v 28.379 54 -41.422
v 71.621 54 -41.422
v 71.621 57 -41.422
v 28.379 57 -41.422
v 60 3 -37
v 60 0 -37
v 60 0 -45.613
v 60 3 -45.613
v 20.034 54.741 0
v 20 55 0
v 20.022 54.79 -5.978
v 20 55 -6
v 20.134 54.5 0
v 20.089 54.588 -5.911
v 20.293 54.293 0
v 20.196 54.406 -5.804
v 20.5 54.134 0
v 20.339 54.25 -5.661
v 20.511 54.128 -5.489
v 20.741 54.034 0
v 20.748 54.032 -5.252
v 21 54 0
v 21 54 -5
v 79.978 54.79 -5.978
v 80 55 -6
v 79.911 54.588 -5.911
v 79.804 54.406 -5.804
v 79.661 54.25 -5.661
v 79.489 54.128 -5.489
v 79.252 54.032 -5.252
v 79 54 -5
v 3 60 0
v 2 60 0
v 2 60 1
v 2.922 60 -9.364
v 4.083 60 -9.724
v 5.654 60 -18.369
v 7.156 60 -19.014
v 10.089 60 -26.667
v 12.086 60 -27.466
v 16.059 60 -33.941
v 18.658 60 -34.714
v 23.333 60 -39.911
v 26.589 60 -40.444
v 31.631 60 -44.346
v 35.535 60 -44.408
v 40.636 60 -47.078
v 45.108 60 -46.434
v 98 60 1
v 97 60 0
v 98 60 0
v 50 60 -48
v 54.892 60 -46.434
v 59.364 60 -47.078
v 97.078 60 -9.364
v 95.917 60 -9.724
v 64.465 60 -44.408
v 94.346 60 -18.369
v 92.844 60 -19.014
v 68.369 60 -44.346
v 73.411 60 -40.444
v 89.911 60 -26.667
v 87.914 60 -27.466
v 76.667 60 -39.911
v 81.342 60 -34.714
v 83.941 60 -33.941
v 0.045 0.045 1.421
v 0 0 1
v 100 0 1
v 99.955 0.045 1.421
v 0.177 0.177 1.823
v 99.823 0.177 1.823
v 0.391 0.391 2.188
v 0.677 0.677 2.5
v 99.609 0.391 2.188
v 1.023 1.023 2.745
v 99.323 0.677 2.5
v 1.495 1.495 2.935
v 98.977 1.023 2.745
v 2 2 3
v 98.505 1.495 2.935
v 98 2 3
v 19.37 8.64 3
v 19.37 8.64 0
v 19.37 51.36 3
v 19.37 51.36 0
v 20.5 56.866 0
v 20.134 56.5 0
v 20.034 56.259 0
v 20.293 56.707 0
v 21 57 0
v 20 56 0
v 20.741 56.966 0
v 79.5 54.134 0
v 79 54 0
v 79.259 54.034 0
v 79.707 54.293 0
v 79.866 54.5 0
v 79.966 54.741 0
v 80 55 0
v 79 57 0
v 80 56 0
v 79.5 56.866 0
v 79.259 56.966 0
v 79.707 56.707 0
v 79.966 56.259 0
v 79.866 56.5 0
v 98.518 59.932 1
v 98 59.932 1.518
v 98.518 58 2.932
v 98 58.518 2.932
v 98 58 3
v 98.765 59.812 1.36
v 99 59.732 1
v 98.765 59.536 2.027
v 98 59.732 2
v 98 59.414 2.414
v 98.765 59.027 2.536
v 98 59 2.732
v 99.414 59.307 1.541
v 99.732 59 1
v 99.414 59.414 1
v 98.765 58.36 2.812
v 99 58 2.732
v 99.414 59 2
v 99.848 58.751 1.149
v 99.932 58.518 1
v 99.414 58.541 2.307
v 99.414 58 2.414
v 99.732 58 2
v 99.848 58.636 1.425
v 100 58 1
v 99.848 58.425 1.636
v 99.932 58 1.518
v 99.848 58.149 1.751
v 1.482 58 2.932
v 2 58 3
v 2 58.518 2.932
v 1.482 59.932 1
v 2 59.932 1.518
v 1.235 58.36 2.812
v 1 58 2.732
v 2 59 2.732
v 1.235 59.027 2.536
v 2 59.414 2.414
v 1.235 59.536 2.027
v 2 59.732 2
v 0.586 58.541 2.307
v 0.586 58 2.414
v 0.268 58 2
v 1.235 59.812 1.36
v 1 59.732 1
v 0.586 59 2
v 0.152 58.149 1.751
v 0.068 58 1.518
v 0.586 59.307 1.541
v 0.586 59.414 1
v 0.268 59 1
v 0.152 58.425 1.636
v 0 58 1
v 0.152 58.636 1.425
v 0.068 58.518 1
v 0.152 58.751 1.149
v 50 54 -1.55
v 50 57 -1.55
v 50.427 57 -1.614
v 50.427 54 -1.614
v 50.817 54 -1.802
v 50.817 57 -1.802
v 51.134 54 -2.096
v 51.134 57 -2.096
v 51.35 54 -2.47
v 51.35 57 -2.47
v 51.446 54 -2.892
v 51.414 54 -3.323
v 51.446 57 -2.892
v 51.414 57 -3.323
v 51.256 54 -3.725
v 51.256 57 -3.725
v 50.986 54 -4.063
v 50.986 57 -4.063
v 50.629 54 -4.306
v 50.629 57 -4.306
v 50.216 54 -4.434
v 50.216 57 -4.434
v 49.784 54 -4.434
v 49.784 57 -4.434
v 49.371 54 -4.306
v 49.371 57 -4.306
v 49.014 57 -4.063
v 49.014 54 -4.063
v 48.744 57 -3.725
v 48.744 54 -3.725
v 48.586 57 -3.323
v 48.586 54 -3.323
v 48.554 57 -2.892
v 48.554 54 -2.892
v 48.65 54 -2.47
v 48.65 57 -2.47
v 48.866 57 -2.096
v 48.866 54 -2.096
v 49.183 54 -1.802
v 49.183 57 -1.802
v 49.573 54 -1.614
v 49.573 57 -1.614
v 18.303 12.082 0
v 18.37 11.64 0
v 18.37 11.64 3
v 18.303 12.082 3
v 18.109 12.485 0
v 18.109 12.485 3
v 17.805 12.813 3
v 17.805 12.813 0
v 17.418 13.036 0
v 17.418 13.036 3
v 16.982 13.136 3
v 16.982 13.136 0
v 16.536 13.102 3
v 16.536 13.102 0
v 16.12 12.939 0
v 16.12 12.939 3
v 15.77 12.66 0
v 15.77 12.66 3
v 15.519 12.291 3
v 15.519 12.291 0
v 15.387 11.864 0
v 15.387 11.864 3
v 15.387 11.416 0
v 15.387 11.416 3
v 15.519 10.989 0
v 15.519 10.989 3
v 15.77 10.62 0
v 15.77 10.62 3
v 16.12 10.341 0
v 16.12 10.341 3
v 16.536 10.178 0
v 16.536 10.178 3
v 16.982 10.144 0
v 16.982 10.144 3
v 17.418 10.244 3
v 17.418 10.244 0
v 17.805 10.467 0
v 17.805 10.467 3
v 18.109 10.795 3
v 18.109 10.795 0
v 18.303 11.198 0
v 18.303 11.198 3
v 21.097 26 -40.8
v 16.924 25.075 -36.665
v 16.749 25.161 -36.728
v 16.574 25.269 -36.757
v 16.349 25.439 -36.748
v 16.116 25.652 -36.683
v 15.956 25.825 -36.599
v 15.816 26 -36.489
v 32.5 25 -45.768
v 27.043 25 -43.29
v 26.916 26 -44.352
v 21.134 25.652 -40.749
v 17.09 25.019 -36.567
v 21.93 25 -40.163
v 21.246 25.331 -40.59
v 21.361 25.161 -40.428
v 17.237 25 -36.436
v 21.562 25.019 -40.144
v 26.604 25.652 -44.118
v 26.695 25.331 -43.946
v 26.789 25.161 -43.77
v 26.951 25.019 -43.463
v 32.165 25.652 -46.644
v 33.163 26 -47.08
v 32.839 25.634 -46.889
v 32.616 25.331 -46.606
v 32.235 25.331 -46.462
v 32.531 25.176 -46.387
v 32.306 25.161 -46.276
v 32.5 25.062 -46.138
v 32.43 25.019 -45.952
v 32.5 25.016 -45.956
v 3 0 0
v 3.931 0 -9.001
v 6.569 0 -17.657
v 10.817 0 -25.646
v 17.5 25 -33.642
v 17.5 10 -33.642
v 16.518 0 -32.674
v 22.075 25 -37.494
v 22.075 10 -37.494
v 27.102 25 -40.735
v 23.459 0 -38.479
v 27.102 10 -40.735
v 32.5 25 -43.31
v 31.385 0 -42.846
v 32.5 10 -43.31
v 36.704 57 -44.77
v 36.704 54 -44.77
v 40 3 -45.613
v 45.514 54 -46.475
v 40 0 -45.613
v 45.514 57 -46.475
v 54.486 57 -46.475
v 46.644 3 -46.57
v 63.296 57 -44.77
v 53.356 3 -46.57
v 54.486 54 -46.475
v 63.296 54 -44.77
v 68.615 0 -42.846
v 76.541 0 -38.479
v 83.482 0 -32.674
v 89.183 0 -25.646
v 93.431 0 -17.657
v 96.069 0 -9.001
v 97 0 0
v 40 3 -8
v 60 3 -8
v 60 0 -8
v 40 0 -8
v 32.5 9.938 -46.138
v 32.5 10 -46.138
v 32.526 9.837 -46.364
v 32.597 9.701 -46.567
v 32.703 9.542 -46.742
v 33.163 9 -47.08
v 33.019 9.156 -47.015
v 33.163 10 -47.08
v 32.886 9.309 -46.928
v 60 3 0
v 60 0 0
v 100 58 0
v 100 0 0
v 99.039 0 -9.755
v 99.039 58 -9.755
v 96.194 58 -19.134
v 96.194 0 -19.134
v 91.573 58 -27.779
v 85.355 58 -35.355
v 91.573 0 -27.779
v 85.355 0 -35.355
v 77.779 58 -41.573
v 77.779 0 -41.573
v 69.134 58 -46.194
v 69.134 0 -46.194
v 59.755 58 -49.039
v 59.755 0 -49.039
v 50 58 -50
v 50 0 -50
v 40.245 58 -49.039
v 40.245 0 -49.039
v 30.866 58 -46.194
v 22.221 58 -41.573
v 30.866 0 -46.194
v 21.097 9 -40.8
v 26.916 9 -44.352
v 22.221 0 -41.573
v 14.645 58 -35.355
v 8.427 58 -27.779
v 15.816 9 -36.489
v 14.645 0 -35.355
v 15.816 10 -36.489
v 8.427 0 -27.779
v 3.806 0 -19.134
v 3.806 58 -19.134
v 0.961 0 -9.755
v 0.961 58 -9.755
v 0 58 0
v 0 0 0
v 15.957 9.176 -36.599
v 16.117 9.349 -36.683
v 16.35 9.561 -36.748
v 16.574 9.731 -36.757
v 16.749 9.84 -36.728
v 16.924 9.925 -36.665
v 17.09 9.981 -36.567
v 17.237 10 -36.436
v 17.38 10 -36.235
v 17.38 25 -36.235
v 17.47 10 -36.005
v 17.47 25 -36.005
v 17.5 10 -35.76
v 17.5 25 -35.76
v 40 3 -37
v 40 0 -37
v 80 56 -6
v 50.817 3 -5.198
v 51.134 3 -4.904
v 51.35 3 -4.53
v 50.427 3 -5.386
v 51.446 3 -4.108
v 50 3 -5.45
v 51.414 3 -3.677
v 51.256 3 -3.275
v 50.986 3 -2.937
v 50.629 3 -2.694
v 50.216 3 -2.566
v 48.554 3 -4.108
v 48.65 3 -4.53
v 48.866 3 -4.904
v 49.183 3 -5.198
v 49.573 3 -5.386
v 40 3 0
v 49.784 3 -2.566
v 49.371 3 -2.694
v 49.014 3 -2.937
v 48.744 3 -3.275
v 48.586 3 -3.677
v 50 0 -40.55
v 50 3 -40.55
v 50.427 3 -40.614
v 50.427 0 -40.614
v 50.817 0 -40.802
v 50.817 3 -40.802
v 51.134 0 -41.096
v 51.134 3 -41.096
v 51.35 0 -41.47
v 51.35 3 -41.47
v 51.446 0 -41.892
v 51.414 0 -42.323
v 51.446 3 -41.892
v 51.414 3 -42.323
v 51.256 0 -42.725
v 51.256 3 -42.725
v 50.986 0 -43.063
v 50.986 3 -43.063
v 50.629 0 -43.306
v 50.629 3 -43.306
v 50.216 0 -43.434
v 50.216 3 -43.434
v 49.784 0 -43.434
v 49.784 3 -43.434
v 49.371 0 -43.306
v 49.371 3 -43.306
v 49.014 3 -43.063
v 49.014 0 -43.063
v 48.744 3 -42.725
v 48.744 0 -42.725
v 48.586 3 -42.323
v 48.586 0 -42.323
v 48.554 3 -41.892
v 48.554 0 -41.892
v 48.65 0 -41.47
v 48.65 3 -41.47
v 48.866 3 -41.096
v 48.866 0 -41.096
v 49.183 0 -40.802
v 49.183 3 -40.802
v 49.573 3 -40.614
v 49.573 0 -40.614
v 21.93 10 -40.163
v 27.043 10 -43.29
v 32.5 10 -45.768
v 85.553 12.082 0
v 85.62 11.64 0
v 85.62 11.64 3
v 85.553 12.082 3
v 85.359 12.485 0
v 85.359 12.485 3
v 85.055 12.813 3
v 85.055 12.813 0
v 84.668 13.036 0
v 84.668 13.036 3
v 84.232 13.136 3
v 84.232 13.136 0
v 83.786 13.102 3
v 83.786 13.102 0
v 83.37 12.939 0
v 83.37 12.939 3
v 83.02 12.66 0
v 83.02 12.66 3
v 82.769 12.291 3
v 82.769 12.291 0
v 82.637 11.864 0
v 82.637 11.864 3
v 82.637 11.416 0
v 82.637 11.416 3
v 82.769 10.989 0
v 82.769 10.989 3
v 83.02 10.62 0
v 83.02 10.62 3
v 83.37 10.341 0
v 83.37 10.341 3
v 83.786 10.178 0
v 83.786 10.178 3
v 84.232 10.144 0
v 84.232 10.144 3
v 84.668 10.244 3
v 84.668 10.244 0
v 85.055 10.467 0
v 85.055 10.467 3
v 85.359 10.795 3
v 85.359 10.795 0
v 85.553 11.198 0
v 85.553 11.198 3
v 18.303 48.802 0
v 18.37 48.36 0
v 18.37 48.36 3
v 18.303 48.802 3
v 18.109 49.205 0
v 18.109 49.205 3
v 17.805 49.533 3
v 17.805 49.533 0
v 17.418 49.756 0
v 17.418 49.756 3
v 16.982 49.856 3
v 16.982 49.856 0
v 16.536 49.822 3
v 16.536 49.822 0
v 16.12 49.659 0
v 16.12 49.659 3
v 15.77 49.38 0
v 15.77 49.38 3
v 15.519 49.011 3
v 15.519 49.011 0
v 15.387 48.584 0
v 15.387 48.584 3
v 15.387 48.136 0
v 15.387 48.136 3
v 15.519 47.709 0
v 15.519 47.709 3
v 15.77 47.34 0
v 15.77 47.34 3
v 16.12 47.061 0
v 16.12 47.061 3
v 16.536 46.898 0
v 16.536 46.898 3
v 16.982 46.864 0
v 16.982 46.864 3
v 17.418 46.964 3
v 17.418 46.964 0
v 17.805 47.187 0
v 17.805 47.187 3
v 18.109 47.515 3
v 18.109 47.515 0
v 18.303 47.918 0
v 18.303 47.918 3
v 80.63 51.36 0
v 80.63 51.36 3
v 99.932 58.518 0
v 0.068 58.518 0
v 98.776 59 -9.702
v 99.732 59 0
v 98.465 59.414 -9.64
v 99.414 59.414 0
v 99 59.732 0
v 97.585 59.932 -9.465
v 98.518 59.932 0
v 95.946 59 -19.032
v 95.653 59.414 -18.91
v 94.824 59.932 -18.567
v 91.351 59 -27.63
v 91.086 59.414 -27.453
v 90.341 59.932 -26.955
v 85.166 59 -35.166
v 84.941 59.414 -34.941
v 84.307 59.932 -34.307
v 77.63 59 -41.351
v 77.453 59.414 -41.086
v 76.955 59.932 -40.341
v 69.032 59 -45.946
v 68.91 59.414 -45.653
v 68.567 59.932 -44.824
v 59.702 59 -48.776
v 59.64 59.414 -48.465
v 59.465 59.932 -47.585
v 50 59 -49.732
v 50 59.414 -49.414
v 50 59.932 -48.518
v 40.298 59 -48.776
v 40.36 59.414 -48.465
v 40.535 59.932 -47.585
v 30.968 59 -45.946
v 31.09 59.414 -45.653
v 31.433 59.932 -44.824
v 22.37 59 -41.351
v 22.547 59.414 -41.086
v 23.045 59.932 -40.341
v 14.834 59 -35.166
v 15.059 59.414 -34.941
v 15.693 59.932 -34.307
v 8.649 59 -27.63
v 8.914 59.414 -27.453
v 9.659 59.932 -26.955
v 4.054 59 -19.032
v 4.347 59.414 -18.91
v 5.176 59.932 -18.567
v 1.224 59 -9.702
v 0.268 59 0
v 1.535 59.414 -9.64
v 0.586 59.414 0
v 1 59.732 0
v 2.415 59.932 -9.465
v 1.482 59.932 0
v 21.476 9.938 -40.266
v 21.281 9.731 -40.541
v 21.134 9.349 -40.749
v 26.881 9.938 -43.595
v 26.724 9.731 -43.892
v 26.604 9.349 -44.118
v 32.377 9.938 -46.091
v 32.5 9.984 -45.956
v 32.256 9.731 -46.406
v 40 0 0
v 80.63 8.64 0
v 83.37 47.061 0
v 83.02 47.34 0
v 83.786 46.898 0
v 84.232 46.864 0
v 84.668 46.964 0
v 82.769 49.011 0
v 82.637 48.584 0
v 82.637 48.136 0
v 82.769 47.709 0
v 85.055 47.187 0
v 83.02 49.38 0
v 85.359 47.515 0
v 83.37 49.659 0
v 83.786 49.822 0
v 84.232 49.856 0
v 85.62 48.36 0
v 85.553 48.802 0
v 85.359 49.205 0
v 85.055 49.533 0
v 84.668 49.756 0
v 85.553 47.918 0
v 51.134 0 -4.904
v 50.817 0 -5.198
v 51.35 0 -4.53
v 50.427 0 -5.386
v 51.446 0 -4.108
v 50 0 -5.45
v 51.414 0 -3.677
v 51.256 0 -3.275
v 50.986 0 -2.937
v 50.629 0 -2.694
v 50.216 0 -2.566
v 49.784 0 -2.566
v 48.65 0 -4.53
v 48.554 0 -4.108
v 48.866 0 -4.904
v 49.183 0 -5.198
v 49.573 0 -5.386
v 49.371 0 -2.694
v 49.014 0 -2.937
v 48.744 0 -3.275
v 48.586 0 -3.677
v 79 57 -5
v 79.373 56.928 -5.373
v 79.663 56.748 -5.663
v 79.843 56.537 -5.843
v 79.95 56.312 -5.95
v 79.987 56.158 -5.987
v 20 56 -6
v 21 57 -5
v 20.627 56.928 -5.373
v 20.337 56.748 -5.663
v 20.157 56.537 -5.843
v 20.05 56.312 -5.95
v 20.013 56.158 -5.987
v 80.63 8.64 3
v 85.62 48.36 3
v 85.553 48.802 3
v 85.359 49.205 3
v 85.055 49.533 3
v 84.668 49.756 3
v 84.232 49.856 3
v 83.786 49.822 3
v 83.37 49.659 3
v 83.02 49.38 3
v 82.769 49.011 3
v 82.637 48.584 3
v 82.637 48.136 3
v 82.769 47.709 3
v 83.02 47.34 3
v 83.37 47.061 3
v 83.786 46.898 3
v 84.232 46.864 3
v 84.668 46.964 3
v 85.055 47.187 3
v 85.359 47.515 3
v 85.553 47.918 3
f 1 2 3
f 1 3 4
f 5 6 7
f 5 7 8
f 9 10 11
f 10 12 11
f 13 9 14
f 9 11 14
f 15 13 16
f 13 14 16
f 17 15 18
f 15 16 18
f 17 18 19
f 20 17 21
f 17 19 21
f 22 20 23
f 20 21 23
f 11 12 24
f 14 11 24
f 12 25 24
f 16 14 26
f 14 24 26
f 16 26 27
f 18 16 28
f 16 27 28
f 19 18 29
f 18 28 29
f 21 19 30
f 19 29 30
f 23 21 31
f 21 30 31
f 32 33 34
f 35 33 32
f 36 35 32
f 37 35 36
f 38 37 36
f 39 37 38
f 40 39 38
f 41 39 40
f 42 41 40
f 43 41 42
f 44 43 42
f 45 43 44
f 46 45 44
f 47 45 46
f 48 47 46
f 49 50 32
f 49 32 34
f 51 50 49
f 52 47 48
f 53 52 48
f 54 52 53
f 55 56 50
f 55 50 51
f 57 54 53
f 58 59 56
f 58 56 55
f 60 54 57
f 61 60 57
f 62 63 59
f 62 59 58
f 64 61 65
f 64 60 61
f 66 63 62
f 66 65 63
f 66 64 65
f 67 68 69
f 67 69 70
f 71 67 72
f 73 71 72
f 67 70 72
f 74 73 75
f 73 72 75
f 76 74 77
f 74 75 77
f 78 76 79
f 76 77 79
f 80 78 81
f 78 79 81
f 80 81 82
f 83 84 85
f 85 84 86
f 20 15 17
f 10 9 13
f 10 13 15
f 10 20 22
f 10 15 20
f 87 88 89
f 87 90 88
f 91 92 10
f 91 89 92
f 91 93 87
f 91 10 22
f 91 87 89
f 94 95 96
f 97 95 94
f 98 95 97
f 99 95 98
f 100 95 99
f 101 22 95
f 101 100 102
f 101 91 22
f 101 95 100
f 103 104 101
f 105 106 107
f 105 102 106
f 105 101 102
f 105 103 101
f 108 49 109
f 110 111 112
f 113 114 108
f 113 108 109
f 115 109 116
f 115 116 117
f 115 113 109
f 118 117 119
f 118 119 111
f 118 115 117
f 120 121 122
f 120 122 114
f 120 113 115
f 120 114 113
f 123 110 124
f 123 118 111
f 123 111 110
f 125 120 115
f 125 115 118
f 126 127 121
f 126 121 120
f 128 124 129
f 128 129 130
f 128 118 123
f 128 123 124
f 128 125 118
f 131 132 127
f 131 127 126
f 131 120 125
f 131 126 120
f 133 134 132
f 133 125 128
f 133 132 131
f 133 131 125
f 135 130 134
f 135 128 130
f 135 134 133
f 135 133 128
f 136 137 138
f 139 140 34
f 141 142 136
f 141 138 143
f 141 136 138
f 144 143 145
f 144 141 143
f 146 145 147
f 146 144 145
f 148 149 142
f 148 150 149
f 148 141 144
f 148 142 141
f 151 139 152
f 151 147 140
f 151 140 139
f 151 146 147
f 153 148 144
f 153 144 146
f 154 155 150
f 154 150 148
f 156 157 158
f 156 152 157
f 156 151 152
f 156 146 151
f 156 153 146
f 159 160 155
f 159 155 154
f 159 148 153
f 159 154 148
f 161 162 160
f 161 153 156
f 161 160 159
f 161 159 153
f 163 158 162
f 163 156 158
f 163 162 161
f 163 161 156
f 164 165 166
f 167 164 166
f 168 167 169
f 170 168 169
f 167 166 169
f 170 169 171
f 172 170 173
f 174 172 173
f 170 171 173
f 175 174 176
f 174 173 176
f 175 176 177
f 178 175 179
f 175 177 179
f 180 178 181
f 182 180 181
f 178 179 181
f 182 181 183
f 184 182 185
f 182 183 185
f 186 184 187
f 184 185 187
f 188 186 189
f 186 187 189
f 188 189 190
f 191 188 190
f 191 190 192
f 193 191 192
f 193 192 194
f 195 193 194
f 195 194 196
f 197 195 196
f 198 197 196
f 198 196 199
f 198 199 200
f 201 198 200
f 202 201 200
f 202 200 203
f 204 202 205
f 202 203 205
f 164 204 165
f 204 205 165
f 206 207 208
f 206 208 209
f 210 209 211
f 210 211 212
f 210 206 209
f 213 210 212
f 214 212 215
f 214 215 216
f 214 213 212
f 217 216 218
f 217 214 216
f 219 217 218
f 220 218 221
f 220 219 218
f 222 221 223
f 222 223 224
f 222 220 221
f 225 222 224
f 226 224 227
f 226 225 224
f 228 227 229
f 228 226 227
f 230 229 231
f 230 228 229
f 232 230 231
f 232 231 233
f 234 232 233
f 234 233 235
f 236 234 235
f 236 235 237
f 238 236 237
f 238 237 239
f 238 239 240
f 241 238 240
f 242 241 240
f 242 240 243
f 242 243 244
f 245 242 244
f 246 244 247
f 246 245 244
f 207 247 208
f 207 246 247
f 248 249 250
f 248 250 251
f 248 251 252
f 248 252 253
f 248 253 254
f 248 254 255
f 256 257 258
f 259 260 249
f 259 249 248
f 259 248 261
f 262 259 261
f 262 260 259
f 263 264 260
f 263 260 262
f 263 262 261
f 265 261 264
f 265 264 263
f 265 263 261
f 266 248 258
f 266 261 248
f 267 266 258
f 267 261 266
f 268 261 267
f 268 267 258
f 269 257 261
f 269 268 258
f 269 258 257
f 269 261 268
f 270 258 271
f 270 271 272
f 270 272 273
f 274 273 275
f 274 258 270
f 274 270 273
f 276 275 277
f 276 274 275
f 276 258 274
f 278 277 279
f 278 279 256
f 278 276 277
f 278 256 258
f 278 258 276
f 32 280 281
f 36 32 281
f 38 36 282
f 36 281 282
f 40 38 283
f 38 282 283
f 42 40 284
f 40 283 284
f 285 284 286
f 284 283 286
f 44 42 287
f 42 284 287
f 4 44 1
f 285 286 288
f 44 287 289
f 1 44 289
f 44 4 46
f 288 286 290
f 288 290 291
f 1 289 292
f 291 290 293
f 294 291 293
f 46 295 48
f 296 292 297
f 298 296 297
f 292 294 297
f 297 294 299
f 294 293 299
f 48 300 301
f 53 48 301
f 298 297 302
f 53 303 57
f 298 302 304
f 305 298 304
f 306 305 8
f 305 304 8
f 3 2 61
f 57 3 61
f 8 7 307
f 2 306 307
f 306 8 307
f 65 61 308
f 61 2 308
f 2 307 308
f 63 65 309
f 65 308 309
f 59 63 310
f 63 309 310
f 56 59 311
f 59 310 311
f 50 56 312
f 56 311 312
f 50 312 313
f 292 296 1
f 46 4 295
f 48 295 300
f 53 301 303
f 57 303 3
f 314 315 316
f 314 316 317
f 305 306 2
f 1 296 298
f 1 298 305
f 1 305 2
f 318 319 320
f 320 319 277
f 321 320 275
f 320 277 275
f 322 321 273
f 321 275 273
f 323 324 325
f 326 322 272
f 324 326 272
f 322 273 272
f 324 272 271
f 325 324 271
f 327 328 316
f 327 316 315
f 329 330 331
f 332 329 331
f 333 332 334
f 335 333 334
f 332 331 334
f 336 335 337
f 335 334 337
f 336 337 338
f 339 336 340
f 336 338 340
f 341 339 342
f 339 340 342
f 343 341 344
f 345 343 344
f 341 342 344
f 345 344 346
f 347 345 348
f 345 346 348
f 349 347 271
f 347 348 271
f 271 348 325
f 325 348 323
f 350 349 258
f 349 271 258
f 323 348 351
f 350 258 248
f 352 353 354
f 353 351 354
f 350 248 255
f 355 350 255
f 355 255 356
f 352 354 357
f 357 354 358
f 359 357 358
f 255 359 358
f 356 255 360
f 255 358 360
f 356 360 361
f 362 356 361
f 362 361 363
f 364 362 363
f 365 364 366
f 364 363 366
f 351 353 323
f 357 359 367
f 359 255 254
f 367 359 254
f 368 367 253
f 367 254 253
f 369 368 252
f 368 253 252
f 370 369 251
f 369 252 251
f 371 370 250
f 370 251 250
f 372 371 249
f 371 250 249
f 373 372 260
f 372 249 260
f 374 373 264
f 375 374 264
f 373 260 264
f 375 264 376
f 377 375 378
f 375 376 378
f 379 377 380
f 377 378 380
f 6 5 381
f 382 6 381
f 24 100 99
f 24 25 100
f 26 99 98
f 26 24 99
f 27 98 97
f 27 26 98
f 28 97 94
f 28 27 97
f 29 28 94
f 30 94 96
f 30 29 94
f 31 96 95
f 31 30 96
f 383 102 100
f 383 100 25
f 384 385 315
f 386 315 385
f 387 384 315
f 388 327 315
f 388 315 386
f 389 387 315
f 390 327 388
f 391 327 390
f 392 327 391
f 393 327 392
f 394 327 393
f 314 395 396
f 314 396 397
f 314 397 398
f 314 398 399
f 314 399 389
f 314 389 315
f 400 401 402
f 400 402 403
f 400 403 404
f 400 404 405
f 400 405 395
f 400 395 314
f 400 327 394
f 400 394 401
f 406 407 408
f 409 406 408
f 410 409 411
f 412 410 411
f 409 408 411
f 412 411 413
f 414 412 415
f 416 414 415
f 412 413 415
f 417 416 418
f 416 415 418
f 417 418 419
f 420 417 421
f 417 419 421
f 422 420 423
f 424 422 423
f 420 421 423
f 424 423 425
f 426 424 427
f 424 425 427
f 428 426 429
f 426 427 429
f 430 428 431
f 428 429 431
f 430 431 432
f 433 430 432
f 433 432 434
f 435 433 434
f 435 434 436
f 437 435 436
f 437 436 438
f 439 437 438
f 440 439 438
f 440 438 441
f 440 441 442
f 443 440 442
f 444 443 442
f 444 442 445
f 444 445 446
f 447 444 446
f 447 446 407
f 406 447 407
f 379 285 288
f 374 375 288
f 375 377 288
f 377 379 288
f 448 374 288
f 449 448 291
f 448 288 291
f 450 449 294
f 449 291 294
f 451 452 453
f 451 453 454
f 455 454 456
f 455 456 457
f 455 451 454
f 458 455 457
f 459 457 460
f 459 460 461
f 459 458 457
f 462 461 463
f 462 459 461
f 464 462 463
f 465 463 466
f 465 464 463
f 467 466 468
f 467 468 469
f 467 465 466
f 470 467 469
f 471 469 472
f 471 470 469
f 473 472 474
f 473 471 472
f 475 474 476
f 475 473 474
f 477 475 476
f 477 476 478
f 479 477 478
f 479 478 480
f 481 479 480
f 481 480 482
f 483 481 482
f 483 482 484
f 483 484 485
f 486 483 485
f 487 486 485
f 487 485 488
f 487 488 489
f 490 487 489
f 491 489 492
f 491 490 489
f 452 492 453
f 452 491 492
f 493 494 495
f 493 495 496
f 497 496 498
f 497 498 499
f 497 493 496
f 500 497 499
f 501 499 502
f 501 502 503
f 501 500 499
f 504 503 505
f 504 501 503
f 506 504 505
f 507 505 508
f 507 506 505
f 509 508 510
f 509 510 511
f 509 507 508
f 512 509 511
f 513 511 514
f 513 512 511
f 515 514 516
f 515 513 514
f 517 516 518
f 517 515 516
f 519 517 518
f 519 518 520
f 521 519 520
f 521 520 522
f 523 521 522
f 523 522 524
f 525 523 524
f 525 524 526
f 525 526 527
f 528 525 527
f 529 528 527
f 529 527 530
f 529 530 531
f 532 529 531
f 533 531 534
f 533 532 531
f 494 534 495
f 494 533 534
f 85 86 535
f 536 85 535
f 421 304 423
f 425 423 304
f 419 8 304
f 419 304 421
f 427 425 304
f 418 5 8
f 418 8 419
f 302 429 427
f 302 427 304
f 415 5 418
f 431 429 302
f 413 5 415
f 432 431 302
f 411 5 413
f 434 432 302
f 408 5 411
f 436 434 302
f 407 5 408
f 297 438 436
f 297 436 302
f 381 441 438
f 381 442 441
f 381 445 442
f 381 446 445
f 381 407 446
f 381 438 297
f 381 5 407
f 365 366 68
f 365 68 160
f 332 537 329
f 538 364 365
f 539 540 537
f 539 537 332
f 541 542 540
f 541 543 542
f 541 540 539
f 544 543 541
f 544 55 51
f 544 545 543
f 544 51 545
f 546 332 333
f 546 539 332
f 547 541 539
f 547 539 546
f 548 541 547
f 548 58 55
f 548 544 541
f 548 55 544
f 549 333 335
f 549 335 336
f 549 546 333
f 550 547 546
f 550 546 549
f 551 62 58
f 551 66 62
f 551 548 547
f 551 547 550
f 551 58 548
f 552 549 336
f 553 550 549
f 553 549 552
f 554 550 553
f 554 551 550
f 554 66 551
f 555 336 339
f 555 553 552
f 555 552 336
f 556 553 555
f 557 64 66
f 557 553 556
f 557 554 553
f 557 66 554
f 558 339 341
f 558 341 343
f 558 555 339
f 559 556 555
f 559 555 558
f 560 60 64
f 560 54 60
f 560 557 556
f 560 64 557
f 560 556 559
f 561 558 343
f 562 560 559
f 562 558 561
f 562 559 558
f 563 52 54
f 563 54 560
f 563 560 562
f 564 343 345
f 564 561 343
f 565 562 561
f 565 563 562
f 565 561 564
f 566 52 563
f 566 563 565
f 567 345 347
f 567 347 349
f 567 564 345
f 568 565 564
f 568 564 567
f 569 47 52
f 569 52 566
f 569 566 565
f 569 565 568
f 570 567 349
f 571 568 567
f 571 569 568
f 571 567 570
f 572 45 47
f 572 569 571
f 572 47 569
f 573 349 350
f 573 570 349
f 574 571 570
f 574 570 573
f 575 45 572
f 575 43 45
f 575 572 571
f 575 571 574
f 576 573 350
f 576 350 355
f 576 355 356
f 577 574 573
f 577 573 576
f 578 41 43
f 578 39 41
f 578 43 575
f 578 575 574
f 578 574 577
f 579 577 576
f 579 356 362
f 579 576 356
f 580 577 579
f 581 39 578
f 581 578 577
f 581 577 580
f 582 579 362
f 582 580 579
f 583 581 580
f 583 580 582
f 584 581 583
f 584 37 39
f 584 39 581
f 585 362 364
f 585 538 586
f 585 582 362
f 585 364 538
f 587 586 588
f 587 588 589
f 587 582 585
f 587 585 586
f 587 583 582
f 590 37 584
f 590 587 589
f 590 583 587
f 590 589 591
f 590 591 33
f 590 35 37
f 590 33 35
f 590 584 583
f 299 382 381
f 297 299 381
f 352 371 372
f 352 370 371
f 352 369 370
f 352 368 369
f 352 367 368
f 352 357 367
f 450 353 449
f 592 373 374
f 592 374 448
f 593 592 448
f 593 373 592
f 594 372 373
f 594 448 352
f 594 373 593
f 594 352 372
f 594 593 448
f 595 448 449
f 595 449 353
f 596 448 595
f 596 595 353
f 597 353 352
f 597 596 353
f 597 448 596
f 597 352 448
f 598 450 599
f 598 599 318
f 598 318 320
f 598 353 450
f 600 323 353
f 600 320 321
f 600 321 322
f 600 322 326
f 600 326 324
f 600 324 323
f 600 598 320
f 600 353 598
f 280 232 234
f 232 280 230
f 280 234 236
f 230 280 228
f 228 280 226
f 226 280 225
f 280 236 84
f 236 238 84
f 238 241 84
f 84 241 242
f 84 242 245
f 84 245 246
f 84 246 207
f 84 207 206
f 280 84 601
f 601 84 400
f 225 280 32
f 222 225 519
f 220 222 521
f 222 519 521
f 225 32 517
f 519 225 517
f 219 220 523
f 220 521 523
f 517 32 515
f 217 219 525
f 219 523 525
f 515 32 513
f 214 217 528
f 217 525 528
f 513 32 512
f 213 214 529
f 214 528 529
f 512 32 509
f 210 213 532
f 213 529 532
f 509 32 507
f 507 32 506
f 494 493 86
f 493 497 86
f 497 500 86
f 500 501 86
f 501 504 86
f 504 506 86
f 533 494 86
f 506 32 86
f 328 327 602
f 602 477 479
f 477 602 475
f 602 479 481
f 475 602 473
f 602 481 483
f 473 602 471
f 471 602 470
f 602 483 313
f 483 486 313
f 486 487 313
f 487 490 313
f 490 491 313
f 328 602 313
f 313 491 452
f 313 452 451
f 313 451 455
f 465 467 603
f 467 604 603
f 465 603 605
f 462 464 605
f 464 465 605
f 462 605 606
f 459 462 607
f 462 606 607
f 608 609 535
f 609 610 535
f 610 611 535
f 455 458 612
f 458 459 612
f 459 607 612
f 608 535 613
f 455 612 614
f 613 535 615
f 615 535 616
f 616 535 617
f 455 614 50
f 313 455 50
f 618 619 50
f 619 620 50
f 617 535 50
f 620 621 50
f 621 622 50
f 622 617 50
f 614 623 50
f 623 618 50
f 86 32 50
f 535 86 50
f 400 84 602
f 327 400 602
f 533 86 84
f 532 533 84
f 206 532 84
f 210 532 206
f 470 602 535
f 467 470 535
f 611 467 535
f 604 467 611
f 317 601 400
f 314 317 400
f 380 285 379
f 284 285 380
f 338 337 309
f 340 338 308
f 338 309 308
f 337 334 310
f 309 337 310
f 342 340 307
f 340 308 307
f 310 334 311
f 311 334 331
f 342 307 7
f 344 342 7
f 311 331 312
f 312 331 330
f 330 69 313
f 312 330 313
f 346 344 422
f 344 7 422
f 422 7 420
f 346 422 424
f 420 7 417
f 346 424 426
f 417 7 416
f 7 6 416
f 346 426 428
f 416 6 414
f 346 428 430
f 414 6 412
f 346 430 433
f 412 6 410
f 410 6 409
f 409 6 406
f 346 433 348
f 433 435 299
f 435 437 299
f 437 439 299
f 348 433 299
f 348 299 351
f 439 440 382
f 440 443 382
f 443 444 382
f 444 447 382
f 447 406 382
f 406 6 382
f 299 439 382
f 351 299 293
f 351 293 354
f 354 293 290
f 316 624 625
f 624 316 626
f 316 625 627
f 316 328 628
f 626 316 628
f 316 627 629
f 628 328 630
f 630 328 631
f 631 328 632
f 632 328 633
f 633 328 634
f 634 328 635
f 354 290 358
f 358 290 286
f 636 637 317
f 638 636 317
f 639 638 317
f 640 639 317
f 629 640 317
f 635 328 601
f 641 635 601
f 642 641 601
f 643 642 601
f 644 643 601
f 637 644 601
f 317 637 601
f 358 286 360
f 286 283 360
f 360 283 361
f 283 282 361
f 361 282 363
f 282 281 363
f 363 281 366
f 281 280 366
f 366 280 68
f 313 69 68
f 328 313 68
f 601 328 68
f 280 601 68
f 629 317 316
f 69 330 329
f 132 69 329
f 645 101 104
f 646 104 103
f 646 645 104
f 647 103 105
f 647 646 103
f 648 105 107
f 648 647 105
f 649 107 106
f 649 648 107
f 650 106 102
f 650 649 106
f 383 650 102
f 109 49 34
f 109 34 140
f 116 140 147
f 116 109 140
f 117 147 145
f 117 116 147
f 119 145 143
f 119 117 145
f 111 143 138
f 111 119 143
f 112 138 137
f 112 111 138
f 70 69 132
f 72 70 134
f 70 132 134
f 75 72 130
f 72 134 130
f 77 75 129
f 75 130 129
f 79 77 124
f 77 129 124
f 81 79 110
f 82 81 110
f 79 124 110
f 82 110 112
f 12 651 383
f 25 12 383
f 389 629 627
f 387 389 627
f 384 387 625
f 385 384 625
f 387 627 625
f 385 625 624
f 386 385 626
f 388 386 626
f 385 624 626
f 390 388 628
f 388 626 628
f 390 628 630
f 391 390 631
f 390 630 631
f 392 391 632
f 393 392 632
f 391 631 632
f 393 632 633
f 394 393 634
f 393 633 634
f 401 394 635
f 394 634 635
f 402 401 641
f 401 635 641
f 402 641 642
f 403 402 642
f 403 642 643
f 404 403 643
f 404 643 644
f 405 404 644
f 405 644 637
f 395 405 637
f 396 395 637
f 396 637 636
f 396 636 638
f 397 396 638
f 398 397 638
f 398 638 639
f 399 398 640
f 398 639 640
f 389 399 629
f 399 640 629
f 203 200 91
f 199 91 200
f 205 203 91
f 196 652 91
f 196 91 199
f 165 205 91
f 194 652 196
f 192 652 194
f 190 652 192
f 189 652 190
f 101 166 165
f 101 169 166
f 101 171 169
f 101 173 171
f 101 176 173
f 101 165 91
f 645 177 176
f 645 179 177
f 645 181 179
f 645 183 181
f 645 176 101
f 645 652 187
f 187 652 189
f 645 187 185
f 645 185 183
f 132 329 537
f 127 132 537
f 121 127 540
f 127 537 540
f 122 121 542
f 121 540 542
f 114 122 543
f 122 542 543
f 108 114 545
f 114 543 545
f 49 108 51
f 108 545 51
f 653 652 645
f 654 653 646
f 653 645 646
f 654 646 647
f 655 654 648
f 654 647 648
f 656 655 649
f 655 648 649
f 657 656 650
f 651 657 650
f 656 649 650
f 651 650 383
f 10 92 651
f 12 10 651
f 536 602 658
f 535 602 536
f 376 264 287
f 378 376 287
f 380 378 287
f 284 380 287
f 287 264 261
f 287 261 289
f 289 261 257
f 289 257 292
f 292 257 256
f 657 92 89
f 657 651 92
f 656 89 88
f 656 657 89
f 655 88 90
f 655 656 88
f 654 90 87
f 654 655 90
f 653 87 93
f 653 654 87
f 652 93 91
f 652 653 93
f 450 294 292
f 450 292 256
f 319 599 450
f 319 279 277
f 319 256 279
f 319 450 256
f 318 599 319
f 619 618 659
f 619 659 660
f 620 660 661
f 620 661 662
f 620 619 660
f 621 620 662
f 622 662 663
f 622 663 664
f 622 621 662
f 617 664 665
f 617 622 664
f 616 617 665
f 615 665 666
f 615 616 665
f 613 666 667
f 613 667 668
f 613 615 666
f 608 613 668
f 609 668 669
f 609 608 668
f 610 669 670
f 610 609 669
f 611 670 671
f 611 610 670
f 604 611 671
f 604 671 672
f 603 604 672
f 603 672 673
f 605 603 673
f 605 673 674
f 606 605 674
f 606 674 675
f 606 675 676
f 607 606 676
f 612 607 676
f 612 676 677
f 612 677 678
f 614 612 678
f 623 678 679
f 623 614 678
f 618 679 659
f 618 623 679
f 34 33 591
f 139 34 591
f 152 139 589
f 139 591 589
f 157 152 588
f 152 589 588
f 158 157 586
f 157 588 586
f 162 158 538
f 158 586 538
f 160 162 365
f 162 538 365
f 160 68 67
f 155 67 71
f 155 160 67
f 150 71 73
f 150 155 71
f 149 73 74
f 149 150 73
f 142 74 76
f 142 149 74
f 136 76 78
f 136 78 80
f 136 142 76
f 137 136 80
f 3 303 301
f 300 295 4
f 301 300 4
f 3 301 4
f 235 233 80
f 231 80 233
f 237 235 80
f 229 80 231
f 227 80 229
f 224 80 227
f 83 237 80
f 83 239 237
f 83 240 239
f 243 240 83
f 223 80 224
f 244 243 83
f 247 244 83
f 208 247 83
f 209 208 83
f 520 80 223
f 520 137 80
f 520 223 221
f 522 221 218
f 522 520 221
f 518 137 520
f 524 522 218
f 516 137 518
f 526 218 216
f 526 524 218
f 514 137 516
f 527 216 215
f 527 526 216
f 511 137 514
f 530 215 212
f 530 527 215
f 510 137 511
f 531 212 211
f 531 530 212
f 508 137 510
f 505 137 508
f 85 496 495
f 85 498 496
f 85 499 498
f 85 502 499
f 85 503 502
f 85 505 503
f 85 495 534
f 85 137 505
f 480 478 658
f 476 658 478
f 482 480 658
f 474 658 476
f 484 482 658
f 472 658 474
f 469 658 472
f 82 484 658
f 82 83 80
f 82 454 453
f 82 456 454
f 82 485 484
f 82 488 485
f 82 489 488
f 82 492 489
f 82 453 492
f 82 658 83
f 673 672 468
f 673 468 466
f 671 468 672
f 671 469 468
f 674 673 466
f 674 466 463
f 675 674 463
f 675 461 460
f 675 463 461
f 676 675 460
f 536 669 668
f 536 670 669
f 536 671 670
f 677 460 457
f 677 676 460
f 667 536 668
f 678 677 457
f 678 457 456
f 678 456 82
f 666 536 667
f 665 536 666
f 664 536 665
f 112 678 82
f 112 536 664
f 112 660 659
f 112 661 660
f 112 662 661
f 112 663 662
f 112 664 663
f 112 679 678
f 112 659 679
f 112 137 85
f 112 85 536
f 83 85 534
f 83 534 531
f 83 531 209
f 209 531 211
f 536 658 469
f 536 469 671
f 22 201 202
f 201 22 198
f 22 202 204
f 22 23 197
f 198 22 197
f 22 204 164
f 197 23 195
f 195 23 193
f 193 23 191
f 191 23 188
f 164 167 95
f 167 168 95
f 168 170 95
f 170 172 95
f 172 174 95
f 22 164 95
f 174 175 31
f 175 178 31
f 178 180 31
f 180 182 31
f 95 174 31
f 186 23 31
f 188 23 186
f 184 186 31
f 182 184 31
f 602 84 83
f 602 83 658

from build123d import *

# Parameters (mm, degrees)
SKETCH1_W                = 100
SKETCH1_H                = 60
SKETCH1_R                = 1.5
SKETCH1_W_2              = 61.26
SKETCH1_H_2              = 42.72
FRONT_FACE_DEPTH         = 3
CURVED_BCK_DEPTH         = 60
FILLET1_R                = 2
FRONT_START              = 57
SKETCH3_W                = 60
SKETCH3_H                = 6
SKETCH3_R                = 1.45
FRONT_RETAINER_DEPTH     = 3
FILLET2_R                = 1
FILLET3_R                = 1
BOSS_EXTRUDE4_START      = 54
BOSS_EXTRUDE4_DEPTH      = 3
CUT_EXTRUDE1_START       = -10
SKETCH5_W                = 15
SKETCH5_H                = 15
CUT_EXTRUDE1_DEPTH       = 53
SKETCH6_W                = 20
SKETCH6_H                = 3
BOSS_EXTRUDE5_DEPTH      = 8
SKETCH7_R                = 1.45
CUT_EXTRUDE2_DEPTH       = 3
FILLET4_R                = 2
FILLET5_R                = 1
BOSS_EXTRUDE6_DEPTH      = 10
BOSS_EXTRUDE6_DEPTH_BACK = 1
BOSS_EXTRUDE6_START      = 30
SKETCH9_W                = 20
SKETCH9_H                = 3
SKETCH10_R               = 1.45
CUT_EXTRUDE3_DEPTH       = 10


with BuildPart() as part:
    # Sketch1 → Front Face (new body)
    with BuildSketch(Plane.XY):
        with Locations((50, 30)):
            Rectangle(SKETCH1_W, SKETCH1_H)
        with Locations((84.12, 48.36)):
            Circle(SKETCH1_R, mode=Mode.SUBTRACT)
        with Locations((16.87, 48.36)):
            Circle(SKETCH1_R, mode=Mode.SUBTRACT)
        with Locations((16.87, 11.64)):
            Circle(SKETCH1_R, mode=Mode.SUBTRACT)
        with Locations((84.12, 11.64)):
            Circle(SKETCH1_R, mode=Mode.SUBTRACT)
        with Locations((50, 30)):
            Rectangle(SKETCH1_W_2, SKETCH1_H_2, mode=Mode.SUBTRACT)
    extrude(amount=FRONT_FACE_DEPTH)

    # Sketch2 → Curved bck (add)
    with BuildSketch(Plane(origin=(0, 0, 0), x_dir=(1, 0, 0), z_dir=(0, 1, 0))):
        with BuildLine():
            Line((0, 0), (3, 0))
            ThreePointArc((3, 0), (50, 46.689559336), (97, 0))
            Line((97, 0), (100, 0))
            ThreePointArc((100, 0), (50, 50), (0, 0))
        make_face()
    extrude(amount=CURVED_BCK_DEPTH)

    # Fillet1
    fillet1_edges = [part.edges().sort_by_distance(p)[0] for p in [
        (100, 30, 3),
        (50, 60, 3),
        (0, 30, 3),
        (50, 0, 3),
    ]]
    fillet(fillet1_edges, radius=FILLET1_R)

    # Sketch4 → Boss-Extrude4 (add)
    with BuildSketch(Plane(origin=(0, 0, 0), x_dir=(1, 0, 0), z_dir=(0, 1, 0)).offset(BOSS_EXTRUDE4_START)):
        with BuildLine():
            Line((71.620680917, 41.421525868), (28.379319083, 41.421525868))
            ThreePointArc((28.379319083, 41.421525868), (50, 46.689559336), (71.620680917, 41.421525868))
        make_face()
    extrude(amount=BOSS_EXTRUDE4_DEPTH)

    # Sketch5 → Cut-Extrude1 (cut)
    with BuildSketch(Plane.XY.offset(CUT_EXTRUDE1_START)):
        with Locations((25, 17.5)):
            Rectangle(SKETCH5_W, SKETCH5_H)
    extrude(amount=-CUT_EXTRUDE1_DEPTH, mode=Mode.SUBTRACT)

    # Sketch6 → Boss-Extrude5 (add)
    with BuildSketch(Plane(origin=(0, 0, 0), x_dir=(-1, 0, 0), z_dir=(0, 0, -1))):
        with Locations((-50, 1.5)):
            Rectangle(SKETCH6_W, SKETCH6_H)
    extrude(amount=BOSS_EXTRUDE5_DEPTH)

    # Sketch7 → Cut-Extrude2 (cut)
    with BuildSketch(Plane.XZ):
        with Locations(Location((50, -4, 0), (0, 0, 270))):
            Circle(SKETCH7_R)
    extrude(amount=-CUT_EXTRUDE2_DEPTH, mode=Mode.SUBTRACT)

    # Fillet4
    # the kernel refuses this fillet: 2 mm, written as the material it takes off along each edge
    with BuildSketch(Plane(origin=(98, 58, 1), x_dir=(0, 1, 0), z_dir=(1, 0, 0))) as fillet4_piece_1_section:
        Polygon((0, 0), (FILLET4_R, 0), (FILLET4_R, FILLET4_R), (0, FILLET4_R), align=None)
    fillet4_piece_1 = extrude(amount=FILLET4_R, mode=Mode.PRIVATE)
    fillet4_piece_1 = fillet4_piece_1 - Plane(origin=(98, 58, 1), x_dir=(0, -0.7071067811865475, -0.7071067811865475), z_dir=(1, 0, 0)) * Sphere(FILLET4_R, mode=Mode.PRIVATE)
    add(fillet4_piece_1, mode=Mode.SUBTRACT)
    with BuildSketch(Plane(origin=(2, 58, 1), x_dir=(0, 1, 0), z_dir=(-1, 0, 0))) as fillet4_piece_2_section:
        Polygon((0, 0), (FILLET4_R, 0), (FILLET4_R, -FILLET4_R), (0, -FILLET4_R), align=None)
    fillet4_piece_2 = extrude(amount=FILLET4_R, mode=Mode.PRIVATE)
    fillet4_piece_2 = fillet4_piece_2 - Plane(origin=(2, 58, 1), x_dir=(0, -0.7071067811865475, -0.7071067811865475), z_dir=(-1, 0, 0)) * Sphere(FILLET4_R, mode=Mode.PRIVATE)
    add(fillet4_piece_2, mode=Mode.SUBTRACT)
    with BuildSketch(Plane(origin=(50, 60, 0), x_dir=(1, 0, 0), z_dir=(0, 0, 1))) as fillet4_piece_3:
        with BuildLine():
            CenterArc((50 - FILLET4_R, -FILLET4_R), FILLET4_R, 0, 90)
            Line((50 - FILLET4_R, 0), (50, 0))
            Line((50, 0), (50, -FILLET4_R))
        make_face()
    revolve(axis=Axis((50, 60, 0), (0, 1, 0)), revolution_arc=180, mode=Mode.SUBTRACT)
    with BuildSketch(Plane(origin=(100, 60, 0), x_dir=(0, -1, 0), z_dir=(0, 0, 1))) as fillet4_piece_4:
        with BuildLine():
            CenterArc((FILLET4_R, -FILLET4_R), FILLET4_R, 90, 90)
            Line((0, -FILLET4_R), (0, 0))
            Line((0, 0), (FILLET4_R, 0))
        make_face()
    extrude(amount=1, mode=Mode.SUBTRACT)
    with BuildSketch(Plane(origin=(0, 60, 0), x_dir=(0, -1, 0), z_dir=(0, 0, 1))) as fillet4_piece_5:
        with BuildLine():
            CenterArc((FILLET4_R, FILLET4_R), FILLET4_R, 180, 90)
            Line((0, FILLET4_R), (0, 0))
            Line((0, 0), (FILLET4_R, 0))
        make_face()
    extrude(amount=1, mode=Mode.SUBTRACT)

    # Fillet5
    # the kernel refuses this fillet: 1 mm, written as the material it takes off along each edge
    with BuildSketch(Plane(origin=(50, 25, 0), x_dir=(-0.6871692739731919, 0, -0.7264973426704026), z_dir=(-0.7264973426704026, 0, 0.6871692739731919))) as fillet5_piece_1_section:
        with BuildLine():
            CenterArc((50 - FILLET5_R, -FILLET5_R), FILLET5_R, 0, 90)
            Line((50 - FILLET5_R, 0), (50, 0))
            Line((50, 0), (50, -FILLET5_R))
        make_face()
    fillet5_piece_1 = revolve(axis=Axis((50, 25, 0), (0, -1, 0)), revolution_arc=25.783978958, mode=Mode.PRIVATE)
    fillet5_piece_1 = split(fillet5_piece_1, bisect_by=Plane(origin=(17.5, 25.281244753, -42.609088652), z_dir=(1, 0, 0)), keep=Keep.TOP, mode=Mode.PRIVATE)
    fillet5_piece_1 = split(fillet5_piece_1, bisect_by=Plane(origin=(32.5, 25.281244753, -42.609088652), z_dir=(-1, 0, 0)), keep=Keep.TOP, mode=Mode.PRIVATE)
    add(fillet5_piece_1, mode=Mode.SUBTRACT)
    with BuildSketch(Plane(origin=(17.5, 25, -37.996710384), x_dir=(-0.7450513884605198, 0, 0.6670070678434014), z_dir=(0, -1, 0))) as fillet5_piece_2:
        with BuildLine():
            CenterArc((2.237210427, -0.999744631), FILLET5_R, 88.705114871, 133.131372131)
            Line((1.492159038, -1.666751699), (0, 0))
            ThreePointArc((0, 0), (1.129904256, 0.012768467), (2.259808512, 0))
        make_face()
    extrude(amount=15, mode=Mode.SUBTRACT)
    with BuildSketch(Plane(origin=(50, 10, 0), x_dir=(-0.6871692739731919, 0, -0.7264973426704026), z_dir=(-0.7264973426704026, 0, 0.6871692739731919))) as fillet5_piece_3_section:
        with BuildLine():
            CenterArc((50 - FILLET5_R, FILLET5_R), FILLET5_R, 270, 90)
            Line((50 - FILLET5_R, 0), (50, 0))
            Line((50, 0), (50, FILLET5_R))
        make_face()
    fillet5_piece_3 = revolve(axis=Axis((50, 10, 0), (0, -1, 0)), revolution_arc=25.783978958, mode=Mode.PRIVATE)
    fillet5_piece_3 = split(fillet5_piece_3, bisect_by=Plane(origin=(17.5, 9.718755246, -42.609088652), z_dir=(1, 0, 0)), keep=Keep.TOP, mode=Mode.PRIVATE)
    fillet5_piece_3 = split(fillet5_piece_3, bisect_by=Plane(origin=(32.5, 9.718755246, -42.609088652), z_dir=(-1, 0, 0)), keep=Keep.TOP, mode=Mode.PRIVATE)
    add(fillet5_piece_3, mode=Mode.SUBTRACT)
    with BuildSketch(Plane(origin=(32.5, 25, -46.837484988), x_dir=(0.9391980540607006, 0, -0.34337590953442465), z_dir=(0, -1, 0))) as fillet5_piece_4:
        with BuildLine():
            CenterArc((0.699141837, 0.999975063), FILLET5_R, 200.082686736, 70.321941643)
            Line((-0.240056217, 0.656599154), (0, 0))
            ThreePointArc((0, 0), (0.353101938, -0.001246825), (0.706203876, 0))
        make_face()
    extrude(amount=15, mode=Mode.SUBTRACT)
    with BuildSketch(Plane(origin=(17.5, 30.64952128, -37.996710384), x_dir=(-0.7450513884605213, 0, 0.6670070678433995), z_dir=(0, -1, 0))) as fillet5_piece_5a_section:
        with BuildLine():
            CenterArc((2.237210427, -0.999744631), FILLET5_R, 88.705114871, 133.131372131)
            Line((1.492159038, -1.666751699), (0, 0))
            ThreePointArc((0, 0), (1.129904256, 0.012768467), (2.259808512, 0))
        make_face()
    fillet5_piece_5a = extrude(amount=20.64952128, mode=Mode.PRIVATE)
    fillet5_piece_5a = split(fillet5_piece_5a, bisect_by=Plane(origin=(17.065734443, 25, -37.044794367), z_dir=(0, 1, 0)), keep=Keep.TOP, mode=Mode.PRIVATE)
    with BuildSketch(Plane(origin=(50, 25, 0), x_dir=(-0.6871692739731919, 0, -0.7264973426704026), z_dir=(-0.7264973426704026, 0, 0.6871692739731919))) as fillet5_piece_5b_section:
        with BuildLine():
            CenterArc((50 - FILLET5_R, -FILLET5_R), FILLET5_R, 0, 90)
            Line((50 - FILLET5_R, 0), (50, 0))
            Line((50, 0), (50, -FILLET5_R))
        make_face()
    fillet5_piece_5b = revolve(axis=Axis((50, 25, 0), (0, -1, 0)), revolution_arc=25.783978958, mode=Mode.PRIVATE)
    fillet5_piece_5b = split(fillet5_piece_5b, bisect_by=Plane(origin=(17.5, 25.237274153, -36.954673212), z_dir=(-1, 0, 0)), keep=Keep.TOP, mode=Mode.PRIVATE)
    fillet5_piece_5 = fillet5_piece_5a & fillet5_piece_5b
    add(fillet5_piece_5, mode=Mode.SUBTRACT)
    with BuildSketch(Plane(origin=(50, 25, 0), x_dir=(-0.6871692739731919, 0, -0.7264973426704026), z_dir=(-0.7264973426704026, 0, 0.6871692739731919))) as fillet5_piece_6a_section:
        with BuildLine():
            CenterArc((50 - FILLET5_R, -FILLET5_R), FILLET5_R, 0, 90)
            Line((50 - FILLET5_R, 0), (50, 0))
            Line((50, 0), (50, -FILLET5_R))
        make_face()
    fillet5_piece_6a = revolve(axis=Axis((50, 25, 0), (0, -1, 0)), revolution_arc=25.783978958, mode=Mode.PRIVATE)
    fillet5_piece_6a = split(fillet5_piece_6a, bisect_by=Plane(origin=(32.5, 25.222938774, -47.02133106), z_dir=(1, 0, 0)), keep=Keep.TOP, mode=Mode.PRIVATE)
    with BuildSketch(Plane(origin=(32.5, 26.76550969, -46.837484988), x_dir=(0.9391980540607002, 0, -0.3433759095344255), z_dir=(0, -1, 0))) as fillet5_piece_6b_section:
        with BuildLine():
            CenterArc((0.699141837, 0.999975063), FILLET5_R, 200.082686736, 70.321941643)
            Line((-0.240056217, 0.656599154), (0, 0))
            ThreePointArc((0, 0), (0.353101938, -0.001246825), (0.706203876, 0))
        make_face()
    fillet5_piece_6b = extrude(amount=16.76550969, mode=Mode.PRIVATE)
    fillet5_piece_6b = split(fillet5_piece_6b, bisect_by=Plane(origin=(32.645581665, 25, -46.738365557), z_dir=(0, 1, 0)), keep=Keep.TOP, mode=Mode.PRIVATE)
    fillet5_piece_6 = fillet5_piece_6a & fillet5_piece_6b
    add(fillet5_piece_6, mode=Mode.SUBTRACT)
    with BuildSketch(Plane(origin=(17.5, 25, -37.996710384), x_dir=(-0.7450513884605198, 0, 0.6670070678434014), z_dir=(0, -1, 0))) as fillet5_piece_7a_section:
        with BuildLine():
            CenterArc((2.237210427, -0.999744631), FILLET5_R, 88.705114871, 133.131372131)
            Line((1.492159038, -1.666751699), (0, 0))
            ThreePointArc((0, 0), (1.129904256, 0.012768467), (2.259808512, 0))
        make_face()
    fillet5_piece_7a = extrude(amount=20.64952128, mode=Mode.PRIVATE)
    fillet5_piece_7a = split(fillet5_piece_7a, bisect_by=Plane(origin=(17.065734443, 10, -37.044794367), z_dir=(0, -1, 0)), keep=Keep.TOP, mode=Mode.PRIVATE)
    with BuildSketch(Plane(origin=(50, 10, 0), x_dir=(-0.6871692739731919, 0, -0.7264973426704026), z_dir=(-0.7264973426704026, 0, 0.6871692739731919))) as fillet5_piece_7b_section:
        with BuildLine():
            CenterArc((50 - FILLET5_R, FILLET5_R), FILLET5_R, 270, 90)
            Line((50 - FILLET5_R, 0), (50, 0))
            Line((50, 0), (50, FILLET5_R))
        make_face()
    fillet5_piece_7b = revolve(axis=Axis((50, 10, 0), (0, -1, 0)), revolution_arc=25.783978958, mode=Mode.PRIVATE)
    fillet5_piece_7b = split(fillet5_piece_7b, bisect_by=Plane(origin=(17.5, 9.762725864, -36.954673145), z_dir=(-1, 0, 0)), keep=Keep.TOP, mode=Mode.PRIVATE)
    fillet5_piece_7 = fillet5_piece_7a & fillet5_piece_7b
    add(fillet5_piece_7, mode=Mode.SUBTRACT)
    with BuildSketch(Plane(origin=(50, 10, 0), x_dir=(-0.6871692739731919, 0, -0.7264973426704026), z_dir=(-0.7264973426704026, 0, 0.6871692739731919))) as fillet5_piece_8a_section:
        with BuildLine():
            CenterArc((50 - FILLET5_R, FILLET5_R), FILLET5_R, 270, 90)
            Line((50 - FILLET5_R, 0), (50, 0))
            Line((50, 0), (50, FILLET5_R))
        make_face()
    fillet5_piece_8a = revolve(axis=Axis((50, 10, 0), (0, -1, 0)), revolution_arc=25.783978958, mode=Mode.PRIVATE)
    fillet5_piece_8a = split(fillet5_piece_8a, bisect_by=Plane(origin=(32.5, 9.777061235, -47.021331079), z_dir=(1, 0, 0)), keep=Keep.TOP, mode=Mode.PRIVATE)
    with BuildSketch(Plane(origin=(32.5, 25, -46.837484988), x_dir=(0.9391980540607006, 0, -0.34337590953442465), z_dir=(0, -1, 0))) as fillet5_piece_8b_section:
        with BuildLine():
            CenterArc((0.699141837, 0.999975063), FILLET5_R, 200.082686736, 70.321941643)
            Line((-0.240056217, 0.656599154), (0, 0))
            ThreePointArc((0, 0), (0.353101938, -0.001246825), (0.706203876, 0))
        make_face()
    fillet5_piece_8b = extrude(amount=16.76550969, mode=Mode.PRIVATE)
    fillet5_piece_8b = split(fillet5_piece_8b, bisect_by=Plane(origin=(32.645581665, 10, -46.738365557), z_dir=(0, -1, 0)), keep=Keep.TOP, mode=Mode.PRIVATE)
    fillet5_piece_8 = fillet5_piece_8a & fillet5_piece_8b
    add(fillet5_piece_8, mode=Mode.SUBTRACT)

    # Sketch9 → Boss-Extrude6 (add, two sides: drawn at the far end of the back side and taken through both)
    with BuildSketch(Plane(origin=(0, 0, -8), x_dir=(-1, 0, 0), z_dir=(0, 0, -1)).offset(BOSS_EXTRUDE6_START - BOSS_EXTRUDE6_DEPTH_BACK)):
        with Locations((-50, 1.5)):
            Rectangle(SKETCH9_W, SKETCH9_H)
    extrude(amount=BOSS_EXTRUDE6_DEPTH + BOSS_EXTRUDE6_DEPTH_BACK)

    # Sketch10 → Cut-Extrude3 (cut)
    with BuildSketch(Plane(origin=(0, 3, 0), x_dir=(1, 0, 0), z_dir=(0, 1, 0))):
        with Locations(Location((50, 42, 0), (0, 0, 270))):
            Circle(SKETCH10_R)
    extrude(amount=-CUT_EXTRUDE3_DEPTH, mode=Mode.SUBTRACT)


with BuildPart() as body_2:
    # Sketch3 → Front retainer (new body)
    with BuildSketch(Plane(origin=(0, 0, 0), x_dir=(1, 0, 0), z_dir=(0, 1, 0)).offset(FRONT_START)):
        with Locations((50, 3)):
            Rectangle(SKETCH3_W, SKETCH3_H)
        with Locations(Location((50, 3, 0), (0, 0, 270))):
            Circle(SKETCH3_R, mode=Mode.SUBTRACT)
    extrude(amount=-FRONT_RETAINER_DEPTH)

    # Fillet2
    fillet2_edges = [body_2.edges().sort_by_distance(p)[0] for p in [
        (80, 54, -3),
        (50, 54, -6),
        (20, 54, -3),
    ]]
    fillet(fillet2_edges, radius=FILLET2_R)

    # Fillet3
    fillet3_edges = [body_2.edges().sort_by_distance(p)[0] for p in [
        (50, 57, -6),
        (80, 57, -3),
        (20, 57, -3),
    ]]
    fillet(fillet3_edges, radius=FILLET3_R)


solid = Compound([part.part, body_2.part])
